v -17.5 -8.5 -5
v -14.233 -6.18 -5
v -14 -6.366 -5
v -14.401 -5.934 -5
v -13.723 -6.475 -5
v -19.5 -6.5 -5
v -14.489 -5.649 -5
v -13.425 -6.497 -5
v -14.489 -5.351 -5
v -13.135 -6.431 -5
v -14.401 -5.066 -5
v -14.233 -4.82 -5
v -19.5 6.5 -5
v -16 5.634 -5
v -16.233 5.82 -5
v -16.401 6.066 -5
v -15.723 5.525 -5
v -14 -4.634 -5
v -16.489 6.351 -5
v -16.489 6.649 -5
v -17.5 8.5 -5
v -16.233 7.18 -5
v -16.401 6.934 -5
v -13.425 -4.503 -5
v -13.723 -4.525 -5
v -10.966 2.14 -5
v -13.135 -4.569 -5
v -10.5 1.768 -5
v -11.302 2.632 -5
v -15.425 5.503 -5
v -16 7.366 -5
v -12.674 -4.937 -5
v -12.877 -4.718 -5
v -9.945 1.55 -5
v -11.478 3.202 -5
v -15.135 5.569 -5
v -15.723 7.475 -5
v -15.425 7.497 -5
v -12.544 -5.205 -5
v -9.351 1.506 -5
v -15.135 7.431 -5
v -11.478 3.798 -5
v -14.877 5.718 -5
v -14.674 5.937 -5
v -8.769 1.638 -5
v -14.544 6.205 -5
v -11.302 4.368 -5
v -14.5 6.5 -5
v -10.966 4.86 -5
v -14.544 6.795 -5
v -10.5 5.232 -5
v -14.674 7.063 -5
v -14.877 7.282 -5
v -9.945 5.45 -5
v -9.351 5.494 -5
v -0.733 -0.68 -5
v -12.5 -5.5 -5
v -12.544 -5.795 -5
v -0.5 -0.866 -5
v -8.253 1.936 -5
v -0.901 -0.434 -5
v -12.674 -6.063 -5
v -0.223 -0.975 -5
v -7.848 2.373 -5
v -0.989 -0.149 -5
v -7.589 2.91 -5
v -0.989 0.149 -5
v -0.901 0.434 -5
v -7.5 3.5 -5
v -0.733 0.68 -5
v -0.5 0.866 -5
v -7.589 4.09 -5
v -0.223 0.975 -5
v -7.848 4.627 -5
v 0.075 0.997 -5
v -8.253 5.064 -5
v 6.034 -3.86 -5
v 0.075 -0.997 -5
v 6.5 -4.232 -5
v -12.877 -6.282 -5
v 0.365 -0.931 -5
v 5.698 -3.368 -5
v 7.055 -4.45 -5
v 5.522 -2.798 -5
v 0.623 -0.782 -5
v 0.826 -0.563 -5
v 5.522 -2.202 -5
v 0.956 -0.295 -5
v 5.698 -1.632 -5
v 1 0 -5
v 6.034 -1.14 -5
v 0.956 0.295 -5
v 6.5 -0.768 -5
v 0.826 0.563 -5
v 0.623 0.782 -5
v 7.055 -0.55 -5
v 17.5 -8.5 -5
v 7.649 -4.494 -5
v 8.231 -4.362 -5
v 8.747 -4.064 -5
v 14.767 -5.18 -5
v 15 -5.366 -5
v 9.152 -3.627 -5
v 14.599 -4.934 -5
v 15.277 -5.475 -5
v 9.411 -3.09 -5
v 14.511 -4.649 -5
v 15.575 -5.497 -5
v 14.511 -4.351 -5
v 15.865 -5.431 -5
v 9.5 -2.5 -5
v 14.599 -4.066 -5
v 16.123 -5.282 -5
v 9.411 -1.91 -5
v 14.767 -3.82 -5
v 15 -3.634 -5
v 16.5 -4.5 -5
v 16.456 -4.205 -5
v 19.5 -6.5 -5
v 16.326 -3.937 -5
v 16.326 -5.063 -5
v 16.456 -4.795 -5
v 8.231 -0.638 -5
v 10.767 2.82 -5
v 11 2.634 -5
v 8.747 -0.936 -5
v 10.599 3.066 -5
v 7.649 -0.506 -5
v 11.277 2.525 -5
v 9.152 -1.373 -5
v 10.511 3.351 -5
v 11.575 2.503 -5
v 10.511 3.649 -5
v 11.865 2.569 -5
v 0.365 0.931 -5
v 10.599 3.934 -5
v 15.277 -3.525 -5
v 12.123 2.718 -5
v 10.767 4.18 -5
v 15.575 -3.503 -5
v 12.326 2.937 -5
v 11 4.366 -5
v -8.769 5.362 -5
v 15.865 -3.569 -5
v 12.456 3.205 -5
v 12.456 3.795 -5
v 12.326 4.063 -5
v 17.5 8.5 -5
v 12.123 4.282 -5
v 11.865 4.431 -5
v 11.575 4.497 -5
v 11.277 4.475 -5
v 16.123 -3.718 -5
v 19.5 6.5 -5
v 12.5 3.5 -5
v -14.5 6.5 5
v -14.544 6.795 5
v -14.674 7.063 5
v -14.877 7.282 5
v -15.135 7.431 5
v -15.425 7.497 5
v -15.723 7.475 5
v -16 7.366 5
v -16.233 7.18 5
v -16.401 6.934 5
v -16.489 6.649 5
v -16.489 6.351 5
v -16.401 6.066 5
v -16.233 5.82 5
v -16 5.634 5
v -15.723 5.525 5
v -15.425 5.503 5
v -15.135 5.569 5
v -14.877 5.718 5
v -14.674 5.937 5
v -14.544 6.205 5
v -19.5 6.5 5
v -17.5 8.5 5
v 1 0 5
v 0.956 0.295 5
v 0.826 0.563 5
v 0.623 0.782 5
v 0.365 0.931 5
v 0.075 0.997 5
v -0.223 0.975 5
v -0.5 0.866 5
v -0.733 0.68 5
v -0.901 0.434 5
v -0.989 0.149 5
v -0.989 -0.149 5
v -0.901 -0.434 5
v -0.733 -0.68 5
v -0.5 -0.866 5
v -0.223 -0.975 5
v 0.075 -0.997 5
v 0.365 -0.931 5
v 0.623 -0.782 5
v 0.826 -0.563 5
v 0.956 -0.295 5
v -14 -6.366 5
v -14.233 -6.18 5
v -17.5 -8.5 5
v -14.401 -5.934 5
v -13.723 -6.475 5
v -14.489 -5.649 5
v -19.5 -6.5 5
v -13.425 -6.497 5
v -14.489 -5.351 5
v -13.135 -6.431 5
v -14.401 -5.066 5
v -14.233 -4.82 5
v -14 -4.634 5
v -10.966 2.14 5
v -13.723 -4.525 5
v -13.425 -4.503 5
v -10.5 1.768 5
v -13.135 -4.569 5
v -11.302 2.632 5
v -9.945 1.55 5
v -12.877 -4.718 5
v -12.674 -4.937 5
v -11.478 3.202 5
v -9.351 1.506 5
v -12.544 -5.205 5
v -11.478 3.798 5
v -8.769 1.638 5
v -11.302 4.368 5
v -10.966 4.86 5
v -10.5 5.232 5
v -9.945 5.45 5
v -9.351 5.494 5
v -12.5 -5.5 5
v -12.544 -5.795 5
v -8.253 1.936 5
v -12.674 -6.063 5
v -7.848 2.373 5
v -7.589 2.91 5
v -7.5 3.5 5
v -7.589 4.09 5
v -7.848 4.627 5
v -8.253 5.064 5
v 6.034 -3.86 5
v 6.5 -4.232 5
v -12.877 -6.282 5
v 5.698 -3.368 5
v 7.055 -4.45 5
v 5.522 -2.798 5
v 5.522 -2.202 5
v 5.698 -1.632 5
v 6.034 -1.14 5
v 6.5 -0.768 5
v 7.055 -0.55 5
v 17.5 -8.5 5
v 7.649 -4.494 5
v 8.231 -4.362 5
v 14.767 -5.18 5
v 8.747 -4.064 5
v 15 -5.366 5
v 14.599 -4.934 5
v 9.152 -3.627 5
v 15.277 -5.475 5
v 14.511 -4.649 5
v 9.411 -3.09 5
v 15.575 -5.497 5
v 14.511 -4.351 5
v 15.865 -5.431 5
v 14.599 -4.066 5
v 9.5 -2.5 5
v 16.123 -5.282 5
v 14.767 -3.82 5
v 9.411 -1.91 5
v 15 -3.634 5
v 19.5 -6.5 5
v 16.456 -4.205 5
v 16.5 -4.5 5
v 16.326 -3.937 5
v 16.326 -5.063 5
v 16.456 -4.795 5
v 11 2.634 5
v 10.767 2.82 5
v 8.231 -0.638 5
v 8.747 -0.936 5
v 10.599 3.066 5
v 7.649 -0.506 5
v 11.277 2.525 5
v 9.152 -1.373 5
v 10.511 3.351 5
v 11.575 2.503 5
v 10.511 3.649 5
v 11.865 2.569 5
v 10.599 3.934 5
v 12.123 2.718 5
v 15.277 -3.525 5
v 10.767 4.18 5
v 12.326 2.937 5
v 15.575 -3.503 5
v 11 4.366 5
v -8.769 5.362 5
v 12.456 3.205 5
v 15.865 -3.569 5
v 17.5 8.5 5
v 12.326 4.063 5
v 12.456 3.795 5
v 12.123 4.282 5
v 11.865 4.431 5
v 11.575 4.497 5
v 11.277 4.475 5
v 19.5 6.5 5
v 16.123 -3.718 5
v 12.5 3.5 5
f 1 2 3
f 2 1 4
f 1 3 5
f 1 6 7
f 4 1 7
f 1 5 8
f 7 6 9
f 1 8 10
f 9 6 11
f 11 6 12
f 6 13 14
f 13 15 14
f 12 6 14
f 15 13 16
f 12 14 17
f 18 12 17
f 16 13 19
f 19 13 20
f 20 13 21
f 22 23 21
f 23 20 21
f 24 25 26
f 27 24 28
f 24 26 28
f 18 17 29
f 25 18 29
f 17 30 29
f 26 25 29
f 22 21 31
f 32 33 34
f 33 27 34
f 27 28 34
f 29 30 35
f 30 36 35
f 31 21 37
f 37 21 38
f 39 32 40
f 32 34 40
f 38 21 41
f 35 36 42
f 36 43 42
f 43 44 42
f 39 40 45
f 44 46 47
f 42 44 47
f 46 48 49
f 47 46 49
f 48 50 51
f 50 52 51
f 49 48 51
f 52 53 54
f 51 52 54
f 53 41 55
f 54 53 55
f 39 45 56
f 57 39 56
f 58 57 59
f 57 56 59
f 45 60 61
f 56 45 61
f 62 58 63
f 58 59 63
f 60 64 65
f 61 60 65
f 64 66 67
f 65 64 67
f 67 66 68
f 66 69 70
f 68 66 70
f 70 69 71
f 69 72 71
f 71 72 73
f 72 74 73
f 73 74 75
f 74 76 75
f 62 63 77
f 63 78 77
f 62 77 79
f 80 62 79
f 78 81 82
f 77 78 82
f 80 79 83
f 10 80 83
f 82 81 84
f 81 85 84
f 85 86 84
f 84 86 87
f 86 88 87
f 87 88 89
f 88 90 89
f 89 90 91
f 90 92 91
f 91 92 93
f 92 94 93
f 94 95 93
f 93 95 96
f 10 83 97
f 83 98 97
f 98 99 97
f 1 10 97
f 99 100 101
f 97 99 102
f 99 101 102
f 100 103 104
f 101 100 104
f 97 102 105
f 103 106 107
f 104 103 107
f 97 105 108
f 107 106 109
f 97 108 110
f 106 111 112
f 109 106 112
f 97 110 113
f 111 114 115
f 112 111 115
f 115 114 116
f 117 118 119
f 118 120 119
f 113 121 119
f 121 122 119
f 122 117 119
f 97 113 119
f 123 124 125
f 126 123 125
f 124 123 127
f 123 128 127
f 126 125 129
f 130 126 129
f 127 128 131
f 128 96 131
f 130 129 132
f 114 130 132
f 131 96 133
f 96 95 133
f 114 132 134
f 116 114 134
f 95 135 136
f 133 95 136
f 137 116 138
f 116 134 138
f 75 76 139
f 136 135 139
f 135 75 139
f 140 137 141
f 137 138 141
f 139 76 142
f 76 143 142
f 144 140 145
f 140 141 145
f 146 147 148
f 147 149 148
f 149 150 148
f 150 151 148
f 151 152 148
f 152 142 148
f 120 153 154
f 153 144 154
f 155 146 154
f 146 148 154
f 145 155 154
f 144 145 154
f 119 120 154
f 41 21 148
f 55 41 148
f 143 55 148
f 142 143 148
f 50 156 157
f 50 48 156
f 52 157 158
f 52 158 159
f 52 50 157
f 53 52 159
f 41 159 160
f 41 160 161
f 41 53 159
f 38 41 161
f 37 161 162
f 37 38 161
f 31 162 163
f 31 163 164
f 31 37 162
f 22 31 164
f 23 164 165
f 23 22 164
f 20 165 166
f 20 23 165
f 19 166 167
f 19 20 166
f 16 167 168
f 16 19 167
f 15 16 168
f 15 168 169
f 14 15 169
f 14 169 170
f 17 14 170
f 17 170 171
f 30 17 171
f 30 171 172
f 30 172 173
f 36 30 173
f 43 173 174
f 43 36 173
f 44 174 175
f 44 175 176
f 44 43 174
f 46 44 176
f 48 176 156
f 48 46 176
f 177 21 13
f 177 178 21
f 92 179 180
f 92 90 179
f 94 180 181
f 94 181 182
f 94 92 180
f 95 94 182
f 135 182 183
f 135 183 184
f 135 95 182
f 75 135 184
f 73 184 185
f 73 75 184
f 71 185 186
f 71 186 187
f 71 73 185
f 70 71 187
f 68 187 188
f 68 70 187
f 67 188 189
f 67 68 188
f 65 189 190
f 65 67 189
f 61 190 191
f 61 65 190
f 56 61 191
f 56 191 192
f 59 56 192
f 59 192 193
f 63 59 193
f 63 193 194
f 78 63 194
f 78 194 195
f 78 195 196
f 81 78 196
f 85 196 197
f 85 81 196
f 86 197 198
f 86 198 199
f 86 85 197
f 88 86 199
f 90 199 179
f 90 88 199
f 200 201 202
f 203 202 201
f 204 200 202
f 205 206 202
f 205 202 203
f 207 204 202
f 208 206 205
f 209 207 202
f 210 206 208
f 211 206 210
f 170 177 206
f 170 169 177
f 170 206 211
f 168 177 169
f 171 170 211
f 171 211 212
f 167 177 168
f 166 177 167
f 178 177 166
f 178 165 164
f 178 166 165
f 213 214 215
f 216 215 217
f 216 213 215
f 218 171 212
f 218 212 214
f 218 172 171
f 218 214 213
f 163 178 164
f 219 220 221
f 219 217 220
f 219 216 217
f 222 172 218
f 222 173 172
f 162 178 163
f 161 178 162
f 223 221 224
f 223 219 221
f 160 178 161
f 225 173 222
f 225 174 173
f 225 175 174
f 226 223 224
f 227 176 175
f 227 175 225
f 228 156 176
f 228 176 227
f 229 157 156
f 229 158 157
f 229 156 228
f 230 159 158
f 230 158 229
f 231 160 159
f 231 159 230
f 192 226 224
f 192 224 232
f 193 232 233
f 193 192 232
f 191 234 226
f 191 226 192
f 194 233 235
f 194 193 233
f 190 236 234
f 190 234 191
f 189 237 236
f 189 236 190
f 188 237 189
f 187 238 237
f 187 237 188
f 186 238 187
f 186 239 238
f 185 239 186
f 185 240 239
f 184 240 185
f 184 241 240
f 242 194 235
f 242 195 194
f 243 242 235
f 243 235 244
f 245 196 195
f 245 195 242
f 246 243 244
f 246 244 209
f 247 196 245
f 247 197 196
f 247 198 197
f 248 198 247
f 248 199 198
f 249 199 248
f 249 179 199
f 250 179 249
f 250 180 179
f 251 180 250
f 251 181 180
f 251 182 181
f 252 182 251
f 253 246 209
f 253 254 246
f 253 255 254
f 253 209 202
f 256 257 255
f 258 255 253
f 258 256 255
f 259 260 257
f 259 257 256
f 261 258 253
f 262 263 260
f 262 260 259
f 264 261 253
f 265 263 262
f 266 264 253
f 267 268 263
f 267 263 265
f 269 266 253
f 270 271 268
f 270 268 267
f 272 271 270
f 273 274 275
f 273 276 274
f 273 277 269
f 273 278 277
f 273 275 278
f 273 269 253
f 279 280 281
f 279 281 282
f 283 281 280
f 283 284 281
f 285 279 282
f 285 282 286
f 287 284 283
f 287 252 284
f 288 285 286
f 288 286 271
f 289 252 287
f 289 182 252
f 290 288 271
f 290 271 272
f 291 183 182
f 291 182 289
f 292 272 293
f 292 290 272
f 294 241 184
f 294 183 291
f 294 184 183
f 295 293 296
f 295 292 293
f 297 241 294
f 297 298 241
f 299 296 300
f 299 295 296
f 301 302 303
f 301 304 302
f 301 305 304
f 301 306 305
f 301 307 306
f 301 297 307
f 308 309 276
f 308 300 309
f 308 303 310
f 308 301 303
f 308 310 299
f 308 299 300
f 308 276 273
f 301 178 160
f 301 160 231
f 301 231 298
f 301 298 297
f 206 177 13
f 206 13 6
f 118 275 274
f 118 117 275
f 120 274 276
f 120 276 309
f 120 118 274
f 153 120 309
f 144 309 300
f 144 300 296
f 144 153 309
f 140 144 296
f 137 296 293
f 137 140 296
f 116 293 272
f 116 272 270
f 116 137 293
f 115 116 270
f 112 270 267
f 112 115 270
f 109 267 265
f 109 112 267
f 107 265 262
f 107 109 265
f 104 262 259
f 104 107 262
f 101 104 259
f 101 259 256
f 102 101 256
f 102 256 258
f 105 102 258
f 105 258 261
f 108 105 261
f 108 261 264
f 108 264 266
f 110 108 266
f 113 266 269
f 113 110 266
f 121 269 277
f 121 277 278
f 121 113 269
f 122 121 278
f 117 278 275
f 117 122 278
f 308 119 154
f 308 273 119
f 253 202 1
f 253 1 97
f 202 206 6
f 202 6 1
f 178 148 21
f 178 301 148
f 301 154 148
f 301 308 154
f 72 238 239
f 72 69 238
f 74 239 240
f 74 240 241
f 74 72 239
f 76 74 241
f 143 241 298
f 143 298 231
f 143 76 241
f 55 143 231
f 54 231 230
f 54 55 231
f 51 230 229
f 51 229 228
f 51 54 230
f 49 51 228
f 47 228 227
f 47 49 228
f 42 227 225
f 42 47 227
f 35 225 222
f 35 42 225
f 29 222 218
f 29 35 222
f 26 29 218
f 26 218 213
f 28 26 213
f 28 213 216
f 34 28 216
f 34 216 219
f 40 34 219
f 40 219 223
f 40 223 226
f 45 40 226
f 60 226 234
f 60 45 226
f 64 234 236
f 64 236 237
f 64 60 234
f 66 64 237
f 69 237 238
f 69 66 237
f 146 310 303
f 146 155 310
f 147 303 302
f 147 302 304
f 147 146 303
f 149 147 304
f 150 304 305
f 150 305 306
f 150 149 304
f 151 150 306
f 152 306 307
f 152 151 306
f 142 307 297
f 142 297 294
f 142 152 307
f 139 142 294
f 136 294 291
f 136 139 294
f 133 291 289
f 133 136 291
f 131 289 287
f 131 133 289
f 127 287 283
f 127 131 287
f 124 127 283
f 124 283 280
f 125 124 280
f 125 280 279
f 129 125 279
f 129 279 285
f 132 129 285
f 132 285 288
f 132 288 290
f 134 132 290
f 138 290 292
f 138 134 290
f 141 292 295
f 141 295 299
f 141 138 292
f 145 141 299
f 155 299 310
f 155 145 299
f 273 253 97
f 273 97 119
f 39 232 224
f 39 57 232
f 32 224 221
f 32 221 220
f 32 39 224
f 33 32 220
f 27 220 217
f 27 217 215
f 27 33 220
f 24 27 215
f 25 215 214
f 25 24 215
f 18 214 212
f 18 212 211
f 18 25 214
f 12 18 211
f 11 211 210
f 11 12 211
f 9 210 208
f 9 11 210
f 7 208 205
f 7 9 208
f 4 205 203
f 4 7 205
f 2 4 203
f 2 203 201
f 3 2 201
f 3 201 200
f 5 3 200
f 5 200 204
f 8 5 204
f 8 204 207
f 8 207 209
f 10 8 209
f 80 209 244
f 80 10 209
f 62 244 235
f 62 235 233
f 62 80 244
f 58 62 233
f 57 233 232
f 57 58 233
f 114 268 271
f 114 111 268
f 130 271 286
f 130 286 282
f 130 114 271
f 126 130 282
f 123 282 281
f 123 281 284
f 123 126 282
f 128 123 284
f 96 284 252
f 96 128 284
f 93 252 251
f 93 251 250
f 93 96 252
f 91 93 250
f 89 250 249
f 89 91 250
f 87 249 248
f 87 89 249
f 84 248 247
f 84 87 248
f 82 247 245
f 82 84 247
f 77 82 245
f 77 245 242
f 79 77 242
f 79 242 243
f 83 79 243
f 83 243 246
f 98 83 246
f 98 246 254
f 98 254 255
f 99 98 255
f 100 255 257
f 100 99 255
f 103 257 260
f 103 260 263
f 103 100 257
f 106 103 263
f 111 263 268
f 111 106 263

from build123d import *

# Parameters (mm, degrees)
SKETCH2_R           = 1
SKETCH2_R_2         = 2
BOSS_EXTRUDE1_DEPTH = 5


with BuildPart() as part:
    # Sketch2 → Boss-Extrude1 (new, symmetric)
    with BuildSketch(Plane.XY):
        Polygon((-17.5, 8.5), (-19.5, 6.5), (-19.5, -6.5), (-17.5, -8.5), (17.5, -8.5), (19.5, -6.5), (19.5, 6.5), (17.5, 8.5), align=None)
        Circle(SKETCH2_R, mode=Mode.SUBTRACT)
        with Locations((-13.5, -5.5)):
            Circle(SKETCH2_R, mode=Mode.SUBTRACT)
        with Locations((-15.5, 6.5)):
            Circle(SKETCH2_R, mode=Mode.SUBTRACT)
        with Locations((-9.5, 3.5)):
            Circle(SKETCH2_R_2, mode=Mode.SUBTRACT)
        with Locations((7.5, -2.5)):
            Circle(SKETCH2_R_2, mode=Mode.SUBTRACT)
        with Locations((15.5, -4.5)):
            Circle(SKETCH2_R, mode=Mode.SUBTRACT)
        with Locations((11.5, 3.5)):
            Circle(SKETCH2_R, mode=Mode.SUBTRACT)
    extrude(amount=BOSS_EXTRUDE1_DEPTH, both=True)


solid = part.part
